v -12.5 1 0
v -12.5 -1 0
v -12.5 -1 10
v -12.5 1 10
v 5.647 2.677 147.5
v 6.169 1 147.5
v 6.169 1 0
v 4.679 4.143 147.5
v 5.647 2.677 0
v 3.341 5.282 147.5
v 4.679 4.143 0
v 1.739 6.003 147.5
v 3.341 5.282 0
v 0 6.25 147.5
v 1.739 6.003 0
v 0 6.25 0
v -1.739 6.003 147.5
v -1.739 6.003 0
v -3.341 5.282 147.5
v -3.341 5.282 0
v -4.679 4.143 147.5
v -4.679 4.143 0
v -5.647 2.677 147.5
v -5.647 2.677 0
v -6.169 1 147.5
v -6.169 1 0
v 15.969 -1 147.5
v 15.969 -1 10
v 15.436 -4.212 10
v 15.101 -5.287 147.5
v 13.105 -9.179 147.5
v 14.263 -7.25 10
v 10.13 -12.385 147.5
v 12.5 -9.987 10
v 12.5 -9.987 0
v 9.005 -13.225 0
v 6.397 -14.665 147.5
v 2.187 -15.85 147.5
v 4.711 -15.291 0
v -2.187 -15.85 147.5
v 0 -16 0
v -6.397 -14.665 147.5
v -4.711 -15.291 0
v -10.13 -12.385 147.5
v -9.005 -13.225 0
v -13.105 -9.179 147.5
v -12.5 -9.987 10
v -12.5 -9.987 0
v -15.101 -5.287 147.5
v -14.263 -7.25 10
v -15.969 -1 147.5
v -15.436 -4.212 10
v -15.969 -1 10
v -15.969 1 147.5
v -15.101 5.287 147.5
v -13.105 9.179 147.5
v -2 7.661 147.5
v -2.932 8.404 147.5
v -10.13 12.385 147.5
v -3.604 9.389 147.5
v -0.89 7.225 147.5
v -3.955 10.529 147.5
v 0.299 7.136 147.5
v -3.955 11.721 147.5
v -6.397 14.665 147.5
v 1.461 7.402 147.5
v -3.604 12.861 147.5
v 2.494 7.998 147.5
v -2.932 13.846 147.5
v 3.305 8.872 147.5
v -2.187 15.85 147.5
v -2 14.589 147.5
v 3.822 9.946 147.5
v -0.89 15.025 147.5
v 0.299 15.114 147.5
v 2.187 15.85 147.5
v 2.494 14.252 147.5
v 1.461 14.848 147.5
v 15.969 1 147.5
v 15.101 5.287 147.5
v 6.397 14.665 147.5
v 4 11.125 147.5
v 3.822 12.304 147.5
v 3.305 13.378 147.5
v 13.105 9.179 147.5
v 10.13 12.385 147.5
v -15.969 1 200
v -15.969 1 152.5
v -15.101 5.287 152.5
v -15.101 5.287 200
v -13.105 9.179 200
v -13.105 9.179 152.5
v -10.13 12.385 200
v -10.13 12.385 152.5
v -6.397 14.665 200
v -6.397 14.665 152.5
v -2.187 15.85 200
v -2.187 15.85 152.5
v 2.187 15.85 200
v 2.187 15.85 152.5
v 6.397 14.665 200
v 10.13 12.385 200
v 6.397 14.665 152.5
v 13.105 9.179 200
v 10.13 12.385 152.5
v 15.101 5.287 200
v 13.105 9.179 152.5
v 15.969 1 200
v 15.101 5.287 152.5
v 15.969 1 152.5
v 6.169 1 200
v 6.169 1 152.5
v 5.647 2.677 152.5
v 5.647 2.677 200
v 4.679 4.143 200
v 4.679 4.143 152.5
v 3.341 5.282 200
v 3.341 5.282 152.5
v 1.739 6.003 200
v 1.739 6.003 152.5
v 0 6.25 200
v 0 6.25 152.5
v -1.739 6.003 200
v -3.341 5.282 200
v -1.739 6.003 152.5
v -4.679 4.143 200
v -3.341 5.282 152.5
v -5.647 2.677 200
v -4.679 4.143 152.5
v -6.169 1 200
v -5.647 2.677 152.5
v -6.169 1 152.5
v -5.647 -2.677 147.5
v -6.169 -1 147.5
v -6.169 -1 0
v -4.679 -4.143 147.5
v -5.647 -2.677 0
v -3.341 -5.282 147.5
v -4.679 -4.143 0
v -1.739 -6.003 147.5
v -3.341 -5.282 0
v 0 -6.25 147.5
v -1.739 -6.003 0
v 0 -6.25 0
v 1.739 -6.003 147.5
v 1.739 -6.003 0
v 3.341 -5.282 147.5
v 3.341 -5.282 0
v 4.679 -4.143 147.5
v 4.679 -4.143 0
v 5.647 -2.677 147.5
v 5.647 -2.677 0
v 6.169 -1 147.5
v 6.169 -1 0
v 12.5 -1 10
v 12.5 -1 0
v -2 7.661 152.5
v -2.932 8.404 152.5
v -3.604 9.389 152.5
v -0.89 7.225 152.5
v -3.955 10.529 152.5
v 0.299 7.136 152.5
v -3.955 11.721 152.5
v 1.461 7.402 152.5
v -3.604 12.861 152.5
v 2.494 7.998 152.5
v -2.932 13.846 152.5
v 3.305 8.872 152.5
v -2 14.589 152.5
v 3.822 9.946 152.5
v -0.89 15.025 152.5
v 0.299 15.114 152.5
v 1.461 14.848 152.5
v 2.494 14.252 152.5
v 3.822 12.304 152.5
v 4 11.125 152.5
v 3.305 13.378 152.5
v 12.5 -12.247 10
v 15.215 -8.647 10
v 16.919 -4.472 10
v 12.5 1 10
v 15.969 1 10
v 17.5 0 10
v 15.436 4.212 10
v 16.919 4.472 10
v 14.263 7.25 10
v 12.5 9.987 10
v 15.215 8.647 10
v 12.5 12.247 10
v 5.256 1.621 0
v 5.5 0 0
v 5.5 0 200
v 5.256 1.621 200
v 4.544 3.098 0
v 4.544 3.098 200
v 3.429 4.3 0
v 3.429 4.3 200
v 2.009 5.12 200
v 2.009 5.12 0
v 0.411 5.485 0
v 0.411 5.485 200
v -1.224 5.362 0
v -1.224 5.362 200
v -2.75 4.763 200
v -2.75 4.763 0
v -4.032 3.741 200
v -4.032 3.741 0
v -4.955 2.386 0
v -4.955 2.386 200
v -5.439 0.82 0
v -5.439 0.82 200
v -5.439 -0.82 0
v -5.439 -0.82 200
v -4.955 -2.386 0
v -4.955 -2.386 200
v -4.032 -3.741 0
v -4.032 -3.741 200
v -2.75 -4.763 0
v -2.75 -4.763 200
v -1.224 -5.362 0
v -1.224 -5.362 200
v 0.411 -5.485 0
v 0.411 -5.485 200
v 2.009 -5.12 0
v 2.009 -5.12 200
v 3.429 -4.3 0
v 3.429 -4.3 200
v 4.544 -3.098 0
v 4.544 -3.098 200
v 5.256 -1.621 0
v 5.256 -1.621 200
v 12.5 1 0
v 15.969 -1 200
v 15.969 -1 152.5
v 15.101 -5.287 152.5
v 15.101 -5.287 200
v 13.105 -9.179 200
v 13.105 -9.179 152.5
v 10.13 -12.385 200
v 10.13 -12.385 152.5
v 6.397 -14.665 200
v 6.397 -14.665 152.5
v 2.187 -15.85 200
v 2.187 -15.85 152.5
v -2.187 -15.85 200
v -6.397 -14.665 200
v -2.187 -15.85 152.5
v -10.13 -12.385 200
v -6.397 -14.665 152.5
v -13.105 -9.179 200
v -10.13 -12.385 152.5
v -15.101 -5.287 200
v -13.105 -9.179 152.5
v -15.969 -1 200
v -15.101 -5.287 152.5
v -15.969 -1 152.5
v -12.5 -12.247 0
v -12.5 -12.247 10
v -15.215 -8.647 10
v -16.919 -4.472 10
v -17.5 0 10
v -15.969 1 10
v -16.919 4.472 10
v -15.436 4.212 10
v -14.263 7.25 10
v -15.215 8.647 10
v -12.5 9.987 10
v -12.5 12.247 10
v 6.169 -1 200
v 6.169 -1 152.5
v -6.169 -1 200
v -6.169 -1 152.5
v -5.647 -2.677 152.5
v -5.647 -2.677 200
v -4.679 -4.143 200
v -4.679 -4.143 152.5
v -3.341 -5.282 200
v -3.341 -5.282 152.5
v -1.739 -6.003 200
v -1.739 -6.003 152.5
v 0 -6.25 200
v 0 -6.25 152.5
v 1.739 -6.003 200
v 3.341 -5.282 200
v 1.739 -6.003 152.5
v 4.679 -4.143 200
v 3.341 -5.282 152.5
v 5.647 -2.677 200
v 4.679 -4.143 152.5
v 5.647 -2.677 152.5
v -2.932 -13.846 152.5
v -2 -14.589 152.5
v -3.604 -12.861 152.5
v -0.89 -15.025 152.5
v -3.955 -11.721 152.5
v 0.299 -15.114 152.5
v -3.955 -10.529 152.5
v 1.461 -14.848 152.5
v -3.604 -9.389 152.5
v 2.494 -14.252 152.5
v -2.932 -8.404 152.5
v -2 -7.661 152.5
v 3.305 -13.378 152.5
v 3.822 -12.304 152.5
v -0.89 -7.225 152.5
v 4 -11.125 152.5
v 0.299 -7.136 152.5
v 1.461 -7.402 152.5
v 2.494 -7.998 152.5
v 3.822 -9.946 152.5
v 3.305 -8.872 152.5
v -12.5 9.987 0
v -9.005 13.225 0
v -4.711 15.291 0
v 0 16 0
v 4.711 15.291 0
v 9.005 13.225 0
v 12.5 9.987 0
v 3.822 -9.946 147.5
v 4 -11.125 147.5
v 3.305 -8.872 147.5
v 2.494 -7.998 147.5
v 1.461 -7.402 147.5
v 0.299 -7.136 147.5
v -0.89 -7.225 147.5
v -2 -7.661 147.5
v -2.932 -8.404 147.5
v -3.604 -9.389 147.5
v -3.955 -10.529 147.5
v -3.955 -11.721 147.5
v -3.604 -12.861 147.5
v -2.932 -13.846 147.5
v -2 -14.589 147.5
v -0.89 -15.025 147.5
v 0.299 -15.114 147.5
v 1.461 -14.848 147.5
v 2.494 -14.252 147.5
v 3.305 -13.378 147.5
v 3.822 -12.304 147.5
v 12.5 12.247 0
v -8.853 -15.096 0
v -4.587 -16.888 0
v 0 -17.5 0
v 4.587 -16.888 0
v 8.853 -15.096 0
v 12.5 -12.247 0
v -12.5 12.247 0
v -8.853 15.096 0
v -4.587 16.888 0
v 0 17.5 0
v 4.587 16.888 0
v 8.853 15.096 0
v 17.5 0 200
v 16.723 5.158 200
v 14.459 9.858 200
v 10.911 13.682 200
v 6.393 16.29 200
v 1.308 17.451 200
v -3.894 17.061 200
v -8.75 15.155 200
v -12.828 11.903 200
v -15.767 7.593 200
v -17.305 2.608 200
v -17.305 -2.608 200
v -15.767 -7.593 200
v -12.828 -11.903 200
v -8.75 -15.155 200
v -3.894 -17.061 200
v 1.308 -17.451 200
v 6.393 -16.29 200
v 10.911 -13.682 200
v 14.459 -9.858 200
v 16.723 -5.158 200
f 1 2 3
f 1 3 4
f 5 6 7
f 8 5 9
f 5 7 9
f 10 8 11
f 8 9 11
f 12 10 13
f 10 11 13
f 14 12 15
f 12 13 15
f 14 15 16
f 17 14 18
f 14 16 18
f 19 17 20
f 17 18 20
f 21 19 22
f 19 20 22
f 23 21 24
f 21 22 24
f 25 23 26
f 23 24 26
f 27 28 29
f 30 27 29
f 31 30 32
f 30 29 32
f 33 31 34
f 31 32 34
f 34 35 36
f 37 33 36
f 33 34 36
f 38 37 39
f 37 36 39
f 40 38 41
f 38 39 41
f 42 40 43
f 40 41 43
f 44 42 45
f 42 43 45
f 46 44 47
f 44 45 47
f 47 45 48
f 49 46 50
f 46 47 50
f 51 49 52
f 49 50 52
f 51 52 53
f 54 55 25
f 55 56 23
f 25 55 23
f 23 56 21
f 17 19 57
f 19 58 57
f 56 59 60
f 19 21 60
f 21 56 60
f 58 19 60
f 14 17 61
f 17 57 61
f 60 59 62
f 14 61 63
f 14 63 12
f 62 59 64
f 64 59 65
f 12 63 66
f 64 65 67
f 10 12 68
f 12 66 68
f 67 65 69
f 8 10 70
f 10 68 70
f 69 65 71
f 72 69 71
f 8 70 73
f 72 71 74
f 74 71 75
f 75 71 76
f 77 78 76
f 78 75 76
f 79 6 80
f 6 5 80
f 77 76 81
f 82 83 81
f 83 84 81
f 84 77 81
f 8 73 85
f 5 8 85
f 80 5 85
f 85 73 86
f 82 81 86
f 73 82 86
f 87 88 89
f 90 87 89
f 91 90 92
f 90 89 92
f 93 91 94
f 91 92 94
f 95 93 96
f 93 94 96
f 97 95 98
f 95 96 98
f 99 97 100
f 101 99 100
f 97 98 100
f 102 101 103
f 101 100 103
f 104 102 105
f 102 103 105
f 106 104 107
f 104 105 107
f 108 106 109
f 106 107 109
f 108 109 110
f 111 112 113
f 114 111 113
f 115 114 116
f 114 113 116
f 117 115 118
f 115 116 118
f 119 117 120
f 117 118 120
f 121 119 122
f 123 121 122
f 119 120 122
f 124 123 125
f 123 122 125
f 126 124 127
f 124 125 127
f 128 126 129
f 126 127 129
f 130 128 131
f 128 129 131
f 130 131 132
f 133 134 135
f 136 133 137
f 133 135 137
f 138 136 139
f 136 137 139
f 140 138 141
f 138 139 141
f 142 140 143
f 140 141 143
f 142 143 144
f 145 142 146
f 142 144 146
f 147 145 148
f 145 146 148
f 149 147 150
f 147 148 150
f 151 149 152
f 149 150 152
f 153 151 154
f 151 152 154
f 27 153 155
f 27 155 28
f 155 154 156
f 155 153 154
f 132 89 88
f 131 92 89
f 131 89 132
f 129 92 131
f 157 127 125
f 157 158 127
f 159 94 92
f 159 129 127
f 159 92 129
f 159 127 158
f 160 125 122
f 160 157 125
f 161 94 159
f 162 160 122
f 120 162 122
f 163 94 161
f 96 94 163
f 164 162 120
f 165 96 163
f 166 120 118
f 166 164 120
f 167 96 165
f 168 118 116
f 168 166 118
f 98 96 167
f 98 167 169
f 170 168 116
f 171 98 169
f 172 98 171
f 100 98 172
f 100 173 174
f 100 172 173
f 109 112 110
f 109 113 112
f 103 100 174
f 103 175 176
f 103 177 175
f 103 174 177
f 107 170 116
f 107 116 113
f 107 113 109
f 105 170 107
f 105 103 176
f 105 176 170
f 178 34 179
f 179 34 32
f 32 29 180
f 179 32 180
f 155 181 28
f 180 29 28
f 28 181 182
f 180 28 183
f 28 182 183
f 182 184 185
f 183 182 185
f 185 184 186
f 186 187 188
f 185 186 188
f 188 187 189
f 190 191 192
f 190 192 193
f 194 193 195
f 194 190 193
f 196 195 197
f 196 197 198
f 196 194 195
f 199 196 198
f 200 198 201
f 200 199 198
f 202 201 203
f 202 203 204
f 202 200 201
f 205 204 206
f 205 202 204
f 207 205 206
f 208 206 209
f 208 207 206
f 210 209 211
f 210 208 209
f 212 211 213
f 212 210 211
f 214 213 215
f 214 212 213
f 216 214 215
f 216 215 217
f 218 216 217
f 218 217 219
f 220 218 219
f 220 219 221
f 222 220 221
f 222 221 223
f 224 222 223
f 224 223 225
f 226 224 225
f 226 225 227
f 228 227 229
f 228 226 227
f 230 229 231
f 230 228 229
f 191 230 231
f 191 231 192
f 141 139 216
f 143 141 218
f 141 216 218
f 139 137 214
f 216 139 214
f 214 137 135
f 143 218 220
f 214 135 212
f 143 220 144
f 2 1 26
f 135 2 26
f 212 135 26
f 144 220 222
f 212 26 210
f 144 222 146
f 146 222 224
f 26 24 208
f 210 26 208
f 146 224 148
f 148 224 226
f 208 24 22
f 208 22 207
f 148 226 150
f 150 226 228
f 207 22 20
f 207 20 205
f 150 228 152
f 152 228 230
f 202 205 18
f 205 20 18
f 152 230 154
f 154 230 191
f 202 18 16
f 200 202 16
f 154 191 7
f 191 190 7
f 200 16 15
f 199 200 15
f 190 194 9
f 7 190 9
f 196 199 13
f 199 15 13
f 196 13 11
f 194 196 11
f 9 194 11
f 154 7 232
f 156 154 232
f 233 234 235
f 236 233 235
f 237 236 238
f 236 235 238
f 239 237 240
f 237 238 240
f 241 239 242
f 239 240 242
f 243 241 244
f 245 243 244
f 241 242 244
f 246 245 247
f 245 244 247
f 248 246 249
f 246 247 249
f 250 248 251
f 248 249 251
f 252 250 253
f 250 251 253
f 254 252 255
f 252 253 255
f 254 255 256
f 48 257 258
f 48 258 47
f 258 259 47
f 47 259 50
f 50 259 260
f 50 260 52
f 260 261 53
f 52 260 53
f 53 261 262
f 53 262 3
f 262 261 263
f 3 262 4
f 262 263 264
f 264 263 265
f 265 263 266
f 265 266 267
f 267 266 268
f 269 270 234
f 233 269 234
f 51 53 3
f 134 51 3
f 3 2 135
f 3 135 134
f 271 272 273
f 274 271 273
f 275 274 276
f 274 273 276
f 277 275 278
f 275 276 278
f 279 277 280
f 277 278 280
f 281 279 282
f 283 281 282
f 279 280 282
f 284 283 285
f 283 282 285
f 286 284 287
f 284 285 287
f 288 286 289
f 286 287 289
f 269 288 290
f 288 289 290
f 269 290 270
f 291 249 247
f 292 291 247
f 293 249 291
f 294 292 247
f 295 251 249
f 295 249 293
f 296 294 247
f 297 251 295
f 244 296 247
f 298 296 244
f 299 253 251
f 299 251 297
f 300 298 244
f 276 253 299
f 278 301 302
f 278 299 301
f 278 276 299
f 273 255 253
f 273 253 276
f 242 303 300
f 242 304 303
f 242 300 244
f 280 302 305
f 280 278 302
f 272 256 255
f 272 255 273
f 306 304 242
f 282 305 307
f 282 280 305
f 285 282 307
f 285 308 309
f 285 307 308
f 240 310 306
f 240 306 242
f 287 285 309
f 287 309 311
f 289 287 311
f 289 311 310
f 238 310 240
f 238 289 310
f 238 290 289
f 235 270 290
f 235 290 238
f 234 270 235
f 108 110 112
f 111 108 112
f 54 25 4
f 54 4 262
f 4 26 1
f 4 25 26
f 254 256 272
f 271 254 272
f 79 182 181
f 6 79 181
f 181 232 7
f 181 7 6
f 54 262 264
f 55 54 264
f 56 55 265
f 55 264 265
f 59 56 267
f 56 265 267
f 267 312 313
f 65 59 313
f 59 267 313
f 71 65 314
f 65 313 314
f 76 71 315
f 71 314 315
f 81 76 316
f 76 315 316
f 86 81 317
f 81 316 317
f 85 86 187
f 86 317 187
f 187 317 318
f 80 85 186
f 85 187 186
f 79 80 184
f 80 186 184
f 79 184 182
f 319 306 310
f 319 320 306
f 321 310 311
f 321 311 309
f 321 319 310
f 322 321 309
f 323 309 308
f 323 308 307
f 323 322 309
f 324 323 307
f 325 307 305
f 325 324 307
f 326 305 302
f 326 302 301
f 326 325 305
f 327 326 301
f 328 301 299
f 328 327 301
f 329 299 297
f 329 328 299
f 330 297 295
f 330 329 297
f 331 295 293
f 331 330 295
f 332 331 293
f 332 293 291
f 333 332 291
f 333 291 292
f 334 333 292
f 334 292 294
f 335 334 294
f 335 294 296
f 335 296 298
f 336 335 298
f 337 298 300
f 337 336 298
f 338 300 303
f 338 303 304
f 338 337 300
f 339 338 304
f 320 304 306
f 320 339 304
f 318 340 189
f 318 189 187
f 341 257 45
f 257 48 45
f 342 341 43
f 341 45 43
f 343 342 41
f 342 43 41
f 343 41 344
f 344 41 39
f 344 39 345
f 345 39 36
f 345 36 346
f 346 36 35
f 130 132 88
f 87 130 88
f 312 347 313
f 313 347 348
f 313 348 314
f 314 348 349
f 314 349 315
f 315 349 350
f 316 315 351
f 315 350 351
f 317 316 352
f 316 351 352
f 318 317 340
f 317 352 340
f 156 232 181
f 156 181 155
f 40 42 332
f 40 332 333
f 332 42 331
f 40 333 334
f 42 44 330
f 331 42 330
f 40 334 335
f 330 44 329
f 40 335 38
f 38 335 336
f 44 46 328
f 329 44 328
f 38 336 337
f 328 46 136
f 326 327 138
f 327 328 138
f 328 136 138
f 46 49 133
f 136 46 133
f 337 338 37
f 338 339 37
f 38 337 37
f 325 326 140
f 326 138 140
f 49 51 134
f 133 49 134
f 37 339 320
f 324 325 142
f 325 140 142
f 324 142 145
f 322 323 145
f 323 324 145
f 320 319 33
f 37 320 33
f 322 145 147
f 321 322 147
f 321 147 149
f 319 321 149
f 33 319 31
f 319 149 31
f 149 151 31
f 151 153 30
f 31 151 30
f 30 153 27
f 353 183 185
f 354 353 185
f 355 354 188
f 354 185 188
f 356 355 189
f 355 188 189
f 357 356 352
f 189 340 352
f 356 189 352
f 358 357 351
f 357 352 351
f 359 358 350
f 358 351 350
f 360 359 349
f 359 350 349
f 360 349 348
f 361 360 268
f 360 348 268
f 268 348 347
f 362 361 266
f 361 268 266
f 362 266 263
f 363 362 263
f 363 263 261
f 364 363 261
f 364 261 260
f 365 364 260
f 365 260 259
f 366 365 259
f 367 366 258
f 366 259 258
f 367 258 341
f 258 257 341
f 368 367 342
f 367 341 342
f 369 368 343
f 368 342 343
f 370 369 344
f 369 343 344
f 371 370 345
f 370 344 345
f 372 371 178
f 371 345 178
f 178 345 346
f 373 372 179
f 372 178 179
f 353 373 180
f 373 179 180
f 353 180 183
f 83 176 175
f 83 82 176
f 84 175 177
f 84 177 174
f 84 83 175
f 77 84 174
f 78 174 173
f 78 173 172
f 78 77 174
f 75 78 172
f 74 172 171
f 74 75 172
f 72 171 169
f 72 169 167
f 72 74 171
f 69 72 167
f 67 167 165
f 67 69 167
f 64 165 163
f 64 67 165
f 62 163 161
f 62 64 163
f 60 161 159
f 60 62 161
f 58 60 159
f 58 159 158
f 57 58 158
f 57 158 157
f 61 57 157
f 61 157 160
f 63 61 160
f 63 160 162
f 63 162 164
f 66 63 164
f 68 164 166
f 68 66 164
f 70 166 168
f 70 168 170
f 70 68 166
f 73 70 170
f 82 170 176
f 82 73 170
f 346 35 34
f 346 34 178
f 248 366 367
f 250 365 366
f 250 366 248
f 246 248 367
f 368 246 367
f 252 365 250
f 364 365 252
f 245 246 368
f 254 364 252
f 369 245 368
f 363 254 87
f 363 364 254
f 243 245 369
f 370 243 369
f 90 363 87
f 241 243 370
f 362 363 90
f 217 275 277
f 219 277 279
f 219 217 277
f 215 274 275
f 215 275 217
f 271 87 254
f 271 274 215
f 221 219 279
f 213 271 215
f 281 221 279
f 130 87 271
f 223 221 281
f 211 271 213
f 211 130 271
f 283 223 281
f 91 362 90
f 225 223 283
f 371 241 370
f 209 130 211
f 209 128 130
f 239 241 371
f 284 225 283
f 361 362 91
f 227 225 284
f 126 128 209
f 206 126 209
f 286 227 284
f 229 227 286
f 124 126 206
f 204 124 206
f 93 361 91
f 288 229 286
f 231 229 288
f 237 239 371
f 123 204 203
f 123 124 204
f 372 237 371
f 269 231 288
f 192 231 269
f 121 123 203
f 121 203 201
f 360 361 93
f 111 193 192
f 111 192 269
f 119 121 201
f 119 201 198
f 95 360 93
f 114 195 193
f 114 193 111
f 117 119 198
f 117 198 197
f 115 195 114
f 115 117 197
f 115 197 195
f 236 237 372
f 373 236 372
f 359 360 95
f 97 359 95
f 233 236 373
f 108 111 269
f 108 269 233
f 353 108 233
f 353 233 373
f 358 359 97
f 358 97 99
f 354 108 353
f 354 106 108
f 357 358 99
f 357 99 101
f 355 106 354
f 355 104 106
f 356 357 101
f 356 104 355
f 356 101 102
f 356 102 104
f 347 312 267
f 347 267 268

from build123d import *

# Parameters (mm, degrees)
SKETCH2_R                       = 17.5
SKETCH2_R_2                     = 5.5
SHELL_DEPTH                     = 200
SKETCH13_R                      = 16
SKETCH13_R_2                    = 6.25
SKETCH13_R_3                    = 4
INNERPARTITION_DEPTH            = 2.5
EASIERASSEMBLY_SHELLSTUDS_DEPTH = 10


with BuildPart() as part:
    # Sketch2 → Shell (new body)
    with BuildSketch(Plane.XY):
        Circle(SKETCH2_R)
        with BuildLine():
            Line((15.968719423, 1), (6.16948134, 1))
            ThreePointArc((6.16948134, 1), (0, 6.25), (-6.16948134, 1))
            Line((-6.16948134, 1), (-15.968719423, 1))
            ThreePointArc((-15.968719423, 1), (0, 16), (15.968719423, 1))
        make_face(mode=Mode.SUBTRACT)
        with BuildLine():
            ThreePointArc((-6.16948134, -1), (0, -6.25), (6.16948134, -1))
            Line((6.16948134, -1), (15.968719423, -1))
            ThreePointArc((15.968719423, -1), (0, -16), (-15.968719423, -1))
            Line((-15.968719423, -1), (-6.16948134, -1))
        make_face(mode=Mode.SUBTRACT)
        Circle(SKETCH2_R_2, mode=Mode.SUBTRACT)
    extrude(amount=SHELL_DEPTH)

    # Sketch13 → InnerPartition (add, symmetric)
    with BuildSketch(Plane.XY.offset(150)):
        Circle(SKETCH13_R)
        Circle(SKETCH13_R_2, mode=Mode.SUBTRACT)
        with Locations((0, 11.125)):
            Circle(SKETCH13_R_3, mode=Mode.SUBTRACT)
        with Locations((0, -11.125)):
            Circle(SKETCH13_R_3, mode=Mode.SUBTRACT)
    extrude(amount=INNERPARTITION_DEPTH, both=True)

    # Sketch2<18> → EasierAssembly_ShellStuds (cut)
    with BuildSketch(Plane.XY):
        with BuildLine():
            Line((12.5, 9.987492178), (12.5, 1))
            Line((12.5, 1), (15.968719423, 1))
            ThreePointArc((15.968719423, 1), (14.92684663, 5.76101117), (12.5, 9.987492178))
        make_face()
        with BuildLine():
            Line((-15.968719423, 1), (-12.5, 1))
            Line((-12.5, 1), (-12.5, 9.987492178))
            ThreePointArc((-12.5, 9.987492178), (-14.92684663, 5.76101117), (-15.968719423, 1))
        make_face()
        with BuildLine():
            ThreePointArc((-15.968719423, -1), (-14.92684663, -5.76101117), (-12.5, -9.987492178))
            Line((-12.5, -9.987492178), (-12.5, -1))
            Line((-12.5, -1), (-15.968719423, -1))
        make_face()
        with BuildLine():
            Line((12.5, -1), (12.5, -9.987492178))
            ThreePointArc((12.5, -9.987492178), (14.92684663, -5.76101117), (15.968719423, -1))
            Line((15.968719423, -1), (12.5, -1))
        make_face()
        with BuildLine():
            Line((12.5, 1), (12.5, -1))
            Line((12.5, -1), (15.968719423, -1))
            ThreePointArc((15.968719423, -1), (15.992177944, -0.500244559), (16, 0))
            ThreePointArc((16, 0), (15.992177944, 0.500244559), (15.968719423, 1))
            Line((15.968719423, 1), (12.5, 1))
        make_face()
        with BuildLine():
            Line((-15.968719423, -1), (-12.5, -1))
            Line((-12.5, -1), (-12.5, 1))
            Line((-12.5, 1), (-15.968719423, 1))
            ThreePointArc((-15.968719423, 1), (-16, 0), (-15.968719423, -1))
        make_face()
        with BuildLine():
            Line((-12.5, -12.247448714), (-12.5, -9.987492178))
            ThreePointArc((-12.5, -9.987492178), (-14.92684663, -5.76101117), (-15.968719423, -1))
            ThreePointArc((-15.968719423, -1), (-16, 0), (-15.968719423, 1))
            ThreePointArc((-15.968719423, 1), (-14.92684663, 5.76101117), (-12.5, 9.987492178))
            Line((-12.5, 9.987492178), (-12.5, 12.247448714))
            ThreePointArc((-12.5, 12.247448714), (-17.5, 0), (-12.5, -12.247448714))
        make_face()
        with BuildLine():
            ThreePointArc((15.968719423, -1), (14.92684663, -5.76101117), (12.5, -9.987492178))
            Line((12.5, -9.987492178), (12.5, -12.247448714))
            ThreePointArc((12.5, -12.247448714), (16.201851746, -6.614378278), (17.5, 0))
            ThreePointArc((17.5, 0), (16.201851746, 6.614378278), (12.5, 12.247448714))
            Line((12.5, 12.247448714), (12.5, 9.987492178))
            ThreePointArc((12.5, 9.987492178), (14.92684663, 5.76101117), (15.968719423, 1))
            ThreePointArc((15.968719423, 1), (15.992177944, 0.500244559), (16, 0))
            ThreePointArc((16, 0), (15.992177944, -0.500244559), (15.968719423, -1))
        make_face()
    extrude(amount=EASIERASSEMBLY_SHELLSTUDS_DEPTH, mode=Mode.SUBTRACT)


solid = part.part
